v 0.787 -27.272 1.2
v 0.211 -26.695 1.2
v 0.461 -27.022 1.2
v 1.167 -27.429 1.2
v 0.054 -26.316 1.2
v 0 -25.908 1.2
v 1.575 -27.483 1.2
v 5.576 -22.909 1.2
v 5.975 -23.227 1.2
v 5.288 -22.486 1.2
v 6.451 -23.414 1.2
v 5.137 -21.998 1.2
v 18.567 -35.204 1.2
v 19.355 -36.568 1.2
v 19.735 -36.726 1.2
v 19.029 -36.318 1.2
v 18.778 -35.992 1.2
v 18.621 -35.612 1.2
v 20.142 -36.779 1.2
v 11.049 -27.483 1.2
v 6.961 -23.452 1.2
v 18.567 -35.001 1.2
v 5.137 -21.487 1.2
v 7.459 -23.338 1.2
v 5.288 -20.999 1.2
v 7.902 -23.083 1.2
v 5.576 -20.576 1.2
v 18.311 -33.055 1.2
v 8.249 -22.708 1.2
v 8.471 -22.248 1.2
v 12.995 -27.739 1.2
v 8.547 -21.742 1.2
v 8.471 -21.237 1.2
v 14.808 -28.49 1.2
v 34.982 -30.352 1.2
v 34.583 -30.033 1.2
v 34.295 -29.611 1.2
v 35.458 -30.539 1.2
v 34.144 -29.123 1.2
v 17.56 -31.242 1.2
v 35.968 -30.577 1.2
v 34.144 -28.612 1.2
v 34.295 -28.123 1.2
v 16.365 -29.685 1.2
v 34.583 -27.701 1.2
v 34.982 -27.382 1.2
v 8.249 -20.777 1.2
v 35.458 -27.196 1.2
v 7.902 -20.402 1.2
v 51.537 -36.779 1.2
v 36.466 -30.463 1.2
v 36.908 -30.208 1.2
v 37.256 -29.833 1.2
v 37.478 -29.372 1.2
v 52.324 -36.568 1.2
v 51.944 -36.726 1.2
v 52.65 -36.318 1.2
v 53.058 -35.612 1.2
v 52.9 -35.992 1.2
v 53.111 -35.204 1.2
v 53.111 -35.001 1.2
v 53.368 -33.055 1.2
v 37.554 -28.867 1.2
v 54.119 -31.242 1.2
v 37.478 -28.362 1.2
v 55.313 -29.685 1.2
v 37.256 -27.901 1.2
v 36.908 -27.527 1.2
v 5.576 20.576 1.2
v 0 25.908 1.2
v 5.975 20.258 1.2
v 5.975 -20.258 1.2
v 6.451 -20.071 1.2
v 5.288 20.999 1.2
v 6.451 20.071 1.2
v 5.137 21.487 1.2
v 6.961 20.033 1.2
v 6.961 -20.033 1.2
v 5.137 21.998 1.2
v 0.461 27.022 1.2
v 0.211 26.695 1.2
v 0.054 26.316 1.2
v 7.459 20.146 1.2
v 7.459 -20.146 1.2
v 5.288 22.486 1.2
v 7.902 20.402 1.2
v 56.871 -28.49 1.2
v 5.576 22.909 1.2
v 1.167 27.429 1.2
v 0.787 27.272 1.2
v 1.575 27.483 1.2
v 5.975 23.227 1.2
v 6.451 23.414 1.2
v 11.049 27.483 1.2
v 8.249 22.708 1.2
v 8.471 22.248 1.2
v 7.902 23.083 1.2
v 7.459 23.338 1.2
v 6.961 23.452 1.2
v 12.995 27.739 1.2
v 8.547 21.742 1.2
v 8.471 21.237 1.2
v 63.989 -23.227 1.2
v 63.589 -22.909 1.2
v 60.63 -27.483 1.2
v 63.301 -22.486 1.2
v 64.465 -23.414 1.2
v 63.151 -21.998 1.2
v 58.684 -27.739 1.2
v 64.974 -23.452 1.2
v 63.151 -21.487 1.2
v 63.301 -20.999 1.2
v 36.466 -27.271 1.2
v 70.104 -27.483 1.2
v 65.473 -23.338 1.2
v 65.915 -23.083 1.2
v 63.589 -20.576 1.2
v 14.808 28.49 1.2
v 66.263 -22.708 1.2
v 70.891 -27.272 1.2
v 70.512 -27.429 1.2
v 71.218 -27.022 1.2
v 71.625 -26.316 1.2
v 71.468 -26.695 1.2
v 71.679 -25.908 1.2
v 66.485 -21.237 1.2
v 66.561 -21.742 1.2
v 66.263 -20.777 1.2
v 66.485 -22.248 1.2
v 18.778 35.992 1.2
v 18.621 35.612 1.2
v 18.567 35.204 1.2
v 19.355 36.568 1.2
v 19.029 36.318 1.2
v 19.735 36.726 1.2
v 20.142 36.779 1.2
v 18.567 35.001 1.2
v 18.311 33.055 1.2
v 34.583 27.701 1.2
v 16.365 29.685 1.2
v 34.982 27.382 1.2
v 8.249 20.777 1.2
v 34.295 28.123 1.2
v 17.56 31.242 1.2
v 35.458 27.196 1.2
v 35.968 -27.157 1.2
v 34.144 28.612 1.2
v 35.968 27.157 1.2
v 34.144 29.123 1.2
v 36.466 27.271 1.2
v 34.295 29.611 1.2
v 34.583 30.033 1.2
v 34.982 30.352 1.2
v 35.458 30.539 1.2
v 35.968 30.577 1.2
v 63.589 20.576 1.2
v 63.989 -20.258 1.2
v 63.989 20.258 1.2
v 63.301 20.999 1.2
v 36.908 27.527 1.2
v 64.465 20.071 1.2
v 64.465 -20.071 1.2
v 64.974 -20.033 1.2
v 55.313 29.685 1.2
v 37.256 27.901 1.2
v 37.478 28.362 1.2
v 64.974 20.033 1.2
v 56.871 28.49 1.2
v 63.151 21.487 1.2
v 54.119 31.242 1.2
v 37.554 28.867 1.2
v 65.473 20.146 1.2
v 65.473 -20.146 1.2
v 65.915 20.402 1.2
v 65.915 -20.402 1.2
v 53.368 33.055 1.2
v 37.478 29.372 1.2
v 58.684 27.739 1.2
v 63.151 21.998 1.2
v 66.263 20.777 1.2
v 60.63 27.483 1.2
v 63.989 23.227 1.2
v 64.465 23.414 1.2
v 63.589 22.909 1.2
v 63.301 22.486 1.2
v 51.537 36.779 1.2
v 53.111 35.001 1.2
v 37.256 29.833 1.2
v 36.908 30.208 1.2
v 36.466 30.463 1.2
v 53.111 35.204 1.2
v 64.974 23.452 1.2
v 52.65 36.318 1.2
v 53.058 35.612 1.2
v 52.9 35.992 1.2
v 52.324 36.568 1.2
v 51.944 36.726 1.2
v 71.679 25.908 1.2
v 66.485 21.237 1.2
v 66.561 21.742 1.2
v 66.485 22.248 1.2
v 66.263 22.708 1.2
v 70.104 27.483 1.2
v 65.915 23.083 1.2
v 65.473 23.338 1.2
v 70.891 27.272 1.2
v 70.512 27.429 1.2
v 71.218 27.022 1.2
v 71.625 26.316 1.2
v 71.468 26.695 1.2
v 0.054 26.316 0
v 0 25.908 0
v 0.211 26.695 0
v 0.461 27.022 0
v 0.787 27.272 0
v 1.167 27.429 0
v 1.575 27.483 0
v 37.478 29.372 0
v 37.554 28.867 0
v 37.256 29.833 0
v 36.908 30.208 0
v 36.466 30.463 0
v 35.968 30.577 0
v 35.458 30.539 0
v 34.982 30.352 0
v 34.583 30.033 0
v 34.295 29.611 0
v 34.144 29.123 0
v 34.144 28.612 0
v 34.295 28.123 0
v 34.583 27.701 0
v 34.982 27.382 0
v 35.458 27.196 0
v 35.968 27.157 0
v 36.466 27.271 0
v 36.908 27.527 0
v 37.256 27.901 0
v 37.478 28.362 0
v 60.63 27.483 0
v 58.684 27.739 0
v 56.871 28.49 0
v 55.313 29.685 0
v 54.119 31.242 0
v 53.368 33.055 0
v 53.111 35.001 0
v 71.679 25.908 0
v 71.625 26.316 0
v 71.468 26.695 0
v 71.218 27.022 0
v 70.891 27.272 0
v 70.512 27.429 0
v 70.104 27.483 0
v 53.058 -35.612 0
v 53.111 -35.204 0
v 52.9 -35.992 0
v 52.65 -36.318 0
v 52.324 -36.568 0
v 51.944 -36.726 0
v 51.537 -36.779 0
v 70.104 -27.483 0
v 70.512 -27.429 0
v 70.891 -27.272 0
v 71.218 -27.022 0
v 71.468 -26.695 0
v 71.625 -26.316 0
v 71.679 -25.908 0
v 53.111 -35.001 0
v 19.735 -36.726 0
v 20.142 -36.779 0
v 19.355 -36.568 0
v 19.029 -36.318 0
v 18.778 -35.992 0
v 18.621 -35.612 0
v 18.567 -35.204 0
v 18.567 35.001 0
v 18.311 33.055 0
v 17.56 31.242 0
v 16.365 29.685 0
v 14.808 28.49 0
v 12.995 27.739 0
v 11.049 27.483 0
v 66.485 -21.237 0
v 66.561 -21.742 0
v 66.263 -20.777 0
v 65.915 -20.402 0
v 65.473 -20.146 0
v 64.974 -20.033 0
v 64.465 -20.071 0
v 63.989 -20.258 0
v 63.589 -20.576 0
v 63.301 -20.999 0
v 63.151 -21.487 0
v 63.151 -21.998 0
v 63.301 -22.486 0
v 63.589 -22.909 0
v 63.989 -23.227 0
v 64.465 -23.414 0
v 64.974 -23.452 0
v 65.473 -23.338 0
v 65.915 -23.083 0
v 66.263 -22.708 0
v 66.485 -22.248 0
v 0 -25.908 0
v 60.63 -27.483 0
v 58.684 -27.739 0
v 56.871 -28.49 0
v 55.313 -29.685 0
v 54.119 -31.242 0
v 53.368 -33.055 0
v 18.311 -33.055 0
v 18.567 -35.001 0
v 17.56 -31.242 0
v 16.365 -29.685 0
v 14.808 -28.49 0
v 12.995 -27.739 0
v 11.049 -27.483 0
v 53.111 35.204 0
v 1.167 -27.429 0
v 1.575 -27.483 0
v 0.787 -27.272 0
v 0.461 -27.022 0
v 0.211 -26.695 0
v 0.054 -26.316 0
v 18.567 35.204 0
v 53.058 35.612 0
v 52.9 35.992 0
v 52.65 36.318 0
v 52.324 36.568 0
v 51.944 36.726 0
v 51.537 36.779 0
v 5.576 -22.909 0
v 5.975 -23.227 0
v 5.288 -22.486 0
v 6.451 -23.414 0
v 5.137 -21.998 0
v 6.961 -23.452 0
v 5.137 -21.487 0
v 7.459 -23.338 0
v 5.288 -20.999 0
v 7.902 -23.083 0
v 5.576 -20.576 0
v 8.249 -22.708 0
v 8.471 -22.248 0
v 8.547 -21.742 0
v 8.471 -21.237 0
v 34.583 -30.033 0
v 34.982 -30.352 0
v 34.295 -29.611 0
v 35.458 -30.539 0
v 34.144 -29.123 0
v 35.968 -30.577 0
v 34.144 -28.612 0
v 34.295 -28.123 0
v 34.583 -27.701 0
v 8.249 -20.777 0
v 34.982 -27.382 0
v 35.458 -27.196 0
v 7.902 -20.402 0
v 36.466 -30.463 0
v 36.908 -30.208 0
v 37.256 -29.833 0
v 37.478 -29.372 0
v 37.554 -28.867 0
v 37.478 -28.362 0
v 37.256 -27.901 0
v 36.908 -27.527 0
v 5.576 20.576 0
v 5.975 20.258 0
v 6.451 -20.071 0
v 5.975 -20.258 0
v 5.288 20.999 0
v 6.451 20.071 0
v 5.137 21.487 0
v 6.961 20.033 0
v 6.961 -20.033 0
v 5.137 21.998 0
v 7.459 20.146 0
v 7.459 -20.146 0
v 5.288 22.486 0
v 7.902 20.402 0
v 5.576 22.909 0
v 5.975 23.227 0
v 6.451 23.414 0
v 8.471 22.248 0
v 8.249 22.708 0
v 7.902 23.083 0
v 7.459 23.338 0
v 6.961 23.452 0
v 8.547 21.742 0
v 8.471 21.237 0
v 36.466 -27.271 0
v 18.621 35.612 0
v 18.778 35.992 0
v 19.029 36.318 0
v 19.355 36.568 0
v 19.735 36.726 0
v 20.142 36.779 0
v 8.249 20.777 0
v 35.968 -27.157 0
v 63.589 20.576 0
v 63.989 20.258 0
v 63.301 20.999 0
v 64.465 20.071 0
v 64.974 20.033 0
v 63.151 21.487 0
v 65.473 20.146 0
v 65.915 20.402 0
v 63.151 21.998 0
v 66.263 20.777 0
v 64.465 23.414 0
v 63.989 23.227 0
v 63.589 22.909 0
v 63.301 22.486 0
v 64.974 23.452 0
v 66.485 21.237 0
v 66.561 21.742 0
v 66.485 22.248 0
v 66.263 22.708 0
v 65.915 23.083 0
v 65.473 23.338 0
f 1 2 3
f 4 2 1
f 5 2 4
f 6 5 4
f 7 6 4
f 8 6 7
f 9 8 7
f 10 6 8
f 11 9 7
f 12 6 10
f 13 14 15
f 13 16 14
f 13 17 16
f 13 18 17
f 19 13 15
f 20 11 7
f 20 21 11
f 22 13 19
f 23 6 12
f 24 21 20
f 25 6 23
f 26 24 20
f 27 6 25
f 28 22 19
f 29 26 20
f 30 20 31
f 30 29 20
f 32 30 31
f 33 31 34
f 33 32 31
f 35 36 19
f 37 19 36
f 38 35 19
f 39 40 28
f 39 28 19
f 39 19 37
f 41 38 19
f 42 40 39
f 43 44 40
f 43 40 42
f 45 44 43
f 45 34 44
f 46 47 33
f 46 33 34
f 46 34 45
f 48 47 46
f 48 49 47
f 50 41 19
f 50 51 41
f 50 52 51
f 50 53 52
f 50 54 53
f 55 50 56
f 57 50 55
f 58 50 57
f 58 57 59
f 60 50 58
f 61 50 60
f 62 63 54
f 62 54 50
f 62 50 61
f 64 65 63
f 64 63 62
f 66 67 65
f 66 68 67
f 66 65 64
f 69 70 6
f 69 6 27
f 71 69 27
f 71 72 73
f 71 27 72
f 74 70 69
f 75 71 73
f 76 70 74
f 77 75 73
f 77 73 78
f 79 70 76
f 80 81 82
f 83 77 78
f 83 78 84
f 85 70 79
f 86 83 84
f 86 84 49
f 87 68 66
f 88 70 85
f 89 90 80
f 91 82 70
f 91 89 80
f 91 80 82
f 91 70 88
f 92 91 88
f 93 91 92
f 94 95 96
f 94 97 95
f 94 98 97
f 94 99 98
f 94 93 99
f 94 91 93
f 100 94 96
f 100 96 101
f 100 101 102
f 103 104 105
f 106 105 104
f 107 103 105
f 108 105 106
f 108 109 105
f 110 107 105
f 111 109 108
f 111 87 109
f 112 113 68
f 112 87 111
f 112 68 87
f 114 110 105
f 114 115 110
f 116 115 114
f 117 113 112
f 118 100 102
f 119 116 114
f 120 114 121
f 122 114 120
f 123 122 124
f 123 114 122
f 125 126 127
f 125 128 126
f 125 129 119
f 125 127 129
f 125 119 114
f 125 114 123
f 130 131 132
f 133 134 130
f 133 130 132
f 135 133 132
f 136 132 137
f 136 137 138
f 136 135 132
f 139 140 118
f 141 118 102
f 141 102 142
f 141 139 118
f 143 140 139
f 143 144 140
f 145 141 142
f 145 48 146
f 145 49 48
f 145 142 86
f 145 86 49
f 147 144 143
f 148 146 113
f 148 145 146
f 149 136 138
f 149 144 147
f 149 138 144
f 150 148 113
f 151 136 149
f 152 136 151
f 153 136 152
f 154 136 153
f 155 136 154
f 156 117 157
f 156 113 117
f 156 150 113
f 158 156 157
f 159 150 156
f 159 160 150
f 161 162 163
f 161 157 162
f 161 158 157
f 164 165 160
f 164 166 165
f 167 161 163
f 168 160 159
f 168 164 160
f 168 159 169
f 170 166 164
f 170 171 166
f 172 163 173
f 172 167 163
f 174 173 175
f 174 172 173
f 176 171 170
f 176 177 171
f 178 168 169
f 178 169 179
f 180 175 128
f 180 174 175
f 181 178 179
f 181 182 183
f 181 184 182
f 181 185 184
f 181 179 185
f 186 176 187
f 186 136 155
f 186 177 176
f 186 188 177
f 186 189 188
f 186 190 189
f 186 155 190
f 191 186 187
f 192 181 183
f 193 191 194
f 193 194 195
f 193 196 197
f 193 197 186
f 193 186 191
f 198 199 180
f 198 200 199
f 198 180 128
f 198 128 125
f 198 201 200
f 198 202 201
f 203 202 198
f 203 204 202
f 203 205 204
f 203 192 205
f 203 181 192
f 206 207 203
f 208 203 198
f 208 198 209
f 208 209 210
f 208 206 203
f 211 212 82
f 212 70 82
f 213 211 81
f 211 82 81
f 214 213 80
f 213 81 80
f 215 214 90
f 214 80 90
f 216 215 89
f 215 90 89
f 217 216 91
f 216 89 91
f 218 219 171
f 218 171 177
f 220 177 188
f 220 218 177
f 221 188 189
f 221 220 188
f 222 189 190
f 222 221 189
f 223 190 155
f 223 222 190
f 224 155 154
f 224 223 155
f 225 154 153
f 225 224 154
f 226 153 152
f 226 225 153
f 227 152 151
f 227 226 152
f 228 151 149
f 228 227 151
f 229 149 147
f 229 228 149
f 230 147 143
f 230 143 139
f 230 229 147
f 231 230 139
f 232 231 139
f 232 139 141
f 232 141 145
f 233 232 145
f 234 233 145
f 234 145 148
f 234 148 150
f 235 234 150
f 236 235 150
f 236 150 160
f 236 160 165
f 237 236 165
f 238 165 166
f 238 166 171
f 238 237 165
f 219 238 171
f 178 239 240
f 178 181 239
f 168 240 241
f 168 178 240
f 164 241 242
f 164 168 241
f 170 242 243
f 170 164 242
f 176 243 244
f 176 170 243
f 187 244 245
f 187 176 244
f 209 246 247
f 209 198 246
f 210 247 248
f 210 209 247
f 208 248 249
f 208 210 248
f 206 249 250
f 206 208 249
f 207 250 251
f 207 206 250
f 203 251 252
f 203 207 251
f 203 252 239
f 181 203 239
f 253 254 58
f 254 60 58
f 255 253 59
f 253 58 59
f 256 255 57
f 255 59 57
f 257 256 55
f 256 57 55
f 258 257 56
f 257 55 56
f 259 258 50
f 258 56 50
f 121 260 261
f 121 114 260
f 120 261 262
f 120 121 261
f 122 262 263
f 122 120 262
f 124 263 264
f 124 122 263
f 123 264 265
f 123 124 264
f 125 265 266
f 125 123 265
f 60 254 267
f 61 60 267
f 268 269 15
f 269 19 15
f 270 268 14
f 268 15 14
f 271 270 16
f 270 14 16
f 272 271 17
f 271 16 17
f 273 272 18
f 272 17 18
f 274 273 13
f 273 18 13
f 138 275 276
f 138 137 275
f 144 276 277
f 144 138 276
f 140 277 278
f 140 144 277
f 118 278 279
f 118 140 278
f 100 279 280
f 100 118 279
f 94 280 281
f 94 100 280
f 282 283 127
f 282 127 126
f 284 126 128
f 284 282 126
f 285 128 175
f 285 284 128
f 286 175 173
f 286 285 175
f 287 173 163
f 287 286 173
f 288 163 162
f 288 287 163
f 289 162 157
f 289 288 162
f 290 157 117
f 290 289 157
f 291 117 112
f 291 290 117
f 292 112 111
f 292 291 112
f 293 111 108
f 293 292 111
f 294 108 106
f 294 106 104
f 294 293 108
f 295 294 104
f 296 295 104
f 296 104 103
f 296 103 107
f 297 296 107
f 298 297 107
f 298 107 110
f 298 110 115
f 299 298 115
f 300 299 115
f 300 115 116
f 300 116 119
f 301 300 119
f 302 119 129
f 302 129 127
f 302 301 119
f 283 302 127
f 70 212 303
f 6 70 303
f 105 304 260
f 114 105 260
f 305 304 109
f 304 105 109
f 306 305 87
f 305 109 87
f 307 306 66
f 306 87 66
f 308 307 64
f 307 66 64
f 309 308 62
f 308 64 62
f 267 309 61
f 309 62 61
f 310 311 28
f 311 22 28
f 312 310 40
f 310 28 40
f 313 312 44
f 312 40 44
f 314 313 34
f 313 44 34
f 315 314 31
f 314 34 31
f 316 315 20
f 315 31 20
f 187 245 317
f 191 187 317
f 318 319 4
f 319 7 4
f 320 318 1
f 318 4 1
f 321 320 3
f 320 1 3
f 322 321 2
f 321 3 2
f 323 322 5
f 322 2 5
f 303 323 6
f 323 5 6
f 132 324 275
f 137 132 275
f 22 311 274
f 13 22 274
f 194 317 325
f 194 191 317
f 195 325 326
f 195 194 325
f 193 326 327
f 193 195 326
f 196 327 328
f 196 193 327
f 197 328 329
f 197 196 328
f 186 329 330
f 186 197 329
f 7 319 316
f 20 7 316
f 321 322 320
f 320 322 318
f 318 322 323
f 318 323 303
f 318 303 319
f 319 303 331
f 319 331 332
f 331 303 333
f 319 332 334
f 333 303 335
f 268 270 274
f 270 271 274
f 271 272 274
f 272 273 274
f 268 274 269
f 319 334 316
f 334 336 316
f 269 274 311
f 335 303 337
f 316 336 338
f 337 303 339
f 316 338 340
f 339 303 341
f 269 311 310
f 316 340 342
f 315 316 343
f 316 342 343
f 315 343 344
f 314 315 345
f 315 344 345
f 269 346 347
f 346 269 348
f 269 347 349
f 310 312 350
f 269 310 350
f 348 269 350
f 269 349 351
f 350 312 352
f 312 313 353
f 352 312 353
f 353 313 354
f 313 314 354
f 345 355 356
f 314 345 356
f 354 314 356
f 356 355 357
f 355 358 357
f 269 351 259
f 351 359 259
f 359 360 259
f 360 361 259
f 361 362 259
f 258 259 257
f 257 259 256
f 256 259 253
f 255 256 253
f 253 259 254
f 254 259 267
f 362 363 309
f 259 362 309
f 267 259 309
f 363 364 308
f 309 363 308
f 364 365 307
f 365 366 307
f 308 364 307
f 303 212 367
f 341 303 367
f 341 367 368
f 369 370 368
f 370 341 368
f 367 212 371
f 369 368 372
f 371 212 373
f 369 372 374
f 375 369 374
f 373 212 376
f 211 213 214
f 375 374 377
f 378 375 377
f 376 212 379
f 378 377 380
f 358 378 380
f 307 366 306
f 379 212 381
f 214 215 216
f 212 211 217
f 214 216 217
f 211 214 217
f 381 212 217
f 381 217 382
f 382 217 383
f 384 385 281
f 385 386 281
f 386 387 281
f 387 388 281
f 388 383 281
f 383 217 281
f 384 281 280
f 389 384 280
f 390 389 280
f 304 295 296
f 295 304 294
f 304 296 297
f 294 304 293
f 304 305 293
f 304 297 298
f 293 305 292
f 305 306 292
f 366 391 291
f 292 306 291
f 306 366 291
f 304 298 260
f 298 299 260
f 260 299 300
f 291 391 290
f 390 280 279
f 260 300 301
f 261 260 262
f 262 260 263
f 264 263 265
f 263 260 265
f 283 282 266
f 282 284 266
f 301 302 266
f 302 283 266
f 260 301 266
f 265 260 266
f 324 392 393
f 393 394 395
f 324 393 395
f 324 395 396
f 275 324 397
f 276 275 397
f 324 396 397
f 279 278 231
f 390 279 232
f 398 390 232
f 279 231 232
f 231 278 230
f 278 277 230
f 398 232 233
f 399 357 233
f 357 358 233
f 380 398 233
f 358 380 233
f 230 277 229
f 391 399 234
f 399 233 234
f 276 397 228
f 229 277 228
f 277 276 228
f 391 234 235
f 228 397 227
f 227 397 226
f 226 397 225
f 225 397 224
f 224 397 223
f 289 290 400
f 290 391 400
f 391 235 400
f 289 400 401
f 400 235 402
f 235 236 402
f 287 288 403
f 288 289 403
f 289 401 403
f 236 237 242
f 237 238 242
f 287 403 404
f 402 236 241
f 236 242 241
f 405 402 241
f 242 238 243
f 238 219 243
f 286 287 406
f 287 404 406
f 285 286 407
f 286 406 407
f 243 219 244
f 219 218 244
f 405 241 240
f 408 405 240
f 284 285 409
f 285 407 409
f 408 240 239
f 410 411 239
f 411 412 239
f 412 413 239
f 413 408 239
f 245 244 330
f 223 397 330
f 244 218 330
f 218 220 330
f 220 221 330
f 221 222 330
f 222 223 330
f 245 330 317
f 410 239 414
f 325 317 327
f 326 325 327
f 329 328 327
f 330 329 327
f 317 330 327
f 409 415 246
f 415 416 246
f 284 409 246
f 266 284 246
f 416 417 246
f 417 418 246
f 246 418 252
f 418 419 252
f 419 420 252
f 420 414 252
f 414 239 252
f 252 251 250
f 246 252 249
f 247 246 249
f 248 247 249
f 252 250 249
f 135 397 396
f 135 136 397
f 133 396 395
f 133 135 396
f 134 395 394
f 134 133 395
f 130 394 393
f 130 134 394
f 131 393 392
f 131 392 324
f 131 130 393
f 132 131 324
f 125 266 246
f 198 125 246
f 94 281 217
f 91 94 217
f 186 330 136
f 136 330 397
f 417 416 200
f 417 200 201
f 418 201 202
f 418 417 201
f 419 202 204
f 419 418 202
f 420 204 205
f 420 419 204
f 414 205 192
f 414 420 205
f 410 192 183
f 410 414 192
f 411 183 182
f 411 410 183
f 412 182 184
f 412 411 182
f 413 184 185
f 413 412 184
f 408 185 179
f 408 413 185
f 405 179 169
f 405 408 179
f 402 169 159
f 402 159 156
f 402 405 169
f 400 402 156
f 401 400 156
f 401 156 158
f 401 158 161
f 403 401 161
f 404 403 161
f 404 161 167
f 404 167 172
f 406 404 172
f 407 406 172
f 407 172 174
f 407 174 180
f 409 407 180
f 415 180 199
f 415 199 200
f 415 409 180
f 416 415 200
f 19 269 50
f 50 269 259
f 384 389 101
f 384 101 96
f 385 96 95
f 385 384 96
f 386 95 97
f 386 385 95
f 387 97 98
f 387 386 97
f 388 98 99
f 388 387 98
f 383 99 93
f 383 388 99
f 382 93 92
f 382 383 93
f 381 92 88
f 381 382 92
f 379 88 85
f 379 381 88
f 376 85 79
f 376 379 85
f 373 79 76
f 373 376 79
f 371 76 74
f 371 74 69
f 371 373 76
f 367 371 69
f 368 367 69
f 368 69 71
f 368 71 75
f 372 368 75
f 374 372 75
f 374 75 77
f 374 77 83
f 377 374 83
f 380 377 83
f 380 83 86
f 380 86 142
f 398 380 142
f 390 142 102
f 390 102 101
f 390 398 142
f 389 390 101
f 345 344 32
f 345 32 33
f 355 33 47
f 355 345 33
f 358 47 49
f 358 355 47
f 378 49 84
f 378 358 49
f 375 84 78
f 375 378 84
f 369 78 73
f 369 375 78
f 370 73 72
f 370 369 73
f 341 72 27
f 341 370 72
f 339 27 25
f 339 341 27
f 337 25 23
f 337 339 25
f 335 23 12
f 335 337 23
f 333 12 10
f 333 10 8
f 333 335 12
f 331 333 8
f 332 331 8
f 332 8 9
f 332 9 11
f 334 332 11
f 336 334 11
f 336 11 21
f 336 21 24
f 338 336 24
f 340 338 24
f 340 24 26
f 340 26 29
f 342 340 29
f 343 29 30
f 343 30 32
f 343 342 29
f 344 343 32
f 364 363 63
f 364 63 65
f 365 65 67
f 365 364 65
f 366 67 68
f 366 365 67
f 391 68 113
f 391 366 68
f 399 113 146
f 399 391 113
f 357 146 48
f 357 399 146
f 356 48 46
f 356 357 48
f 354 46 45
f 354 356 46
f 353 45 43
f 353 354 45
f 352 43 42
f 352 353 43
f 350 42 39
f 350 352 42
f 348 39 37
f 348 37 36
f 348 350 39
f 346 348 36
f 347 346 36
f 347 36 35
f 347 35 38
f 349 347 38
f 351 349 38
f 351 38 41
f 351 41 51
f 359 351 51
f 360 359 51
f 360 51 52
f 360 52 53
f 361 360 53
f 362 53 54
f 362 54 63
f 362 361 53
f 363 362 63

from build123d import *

# Parameters (mm, degrees)
SKETCH1_R      = 1.7145
MAINBODY_DEPTH = 1.2
LARGEROUNDS_R  = 7.5184
SMALLROUNDS_R  = 1.5748


with BuildPart() as part:
    # Sketch1 → MainBody (new body)
    with BuildSketch(Plane.XY):
        Polygon((71.6788, -27.4828), (71.6788, 27.4828), (53.1114, 27.4828), (53.1114, 36.7792), (18.5674, 36.7792), (18.5674, 27.4828), (0, 27.4828), (0, -27.4828), (18.5674, -27.4828), (18.5674, -36.7792), (53.1114, -36.7792), (53.1114, -27.4828), align=None)
        with Locations((64.8462, -21.7424)):
            Circle(SKETCH1_R, mode=Mode.SUBTRACT)
        with Locations((6.8326, -21.7424)):
            Circle(SKETCH1_R, mode=Mode.SUBTRACT)
        with Locations((6.8326, 21.7424)):
            Circle(SKETCH1_R, mode=Mode.SUBTRACT)
        with Locations((64.8462, 21.7424)):
            Circle(SKETCH1_R, mode=Mode.SUBTRACT)
        with Locations((35.8394, -28.8671)):
            Circle(SKETCH1_R, mode=Mode.SUBTRACT)
        with Locations((35.8394, 28.8671)):
            Circle(SKETCH1_R, mode=Mode.SUBTRACT)
    extrude(amount=MAINBODY_DEPTH)

    # LargeRounds
    largerounds_edges = [part.edges().sort_by_distance(p)[0] for p in [
        (53.1114, -27.4828, 0.6),
        (18.5674, -27.4828, 0.6),
        (18.5674, 27.4828, 0.6),
        (53.1114, 27.4828, 0.6),
    ]]
    fillet(largerounds_edges, radius=LARGEROUNDS_R)

    # SmallRounds
    smallrounds_edges = [part.edges().sort_by_distance(p)[0] for p in [
        (53.1114, -36.7792, 0.6),
        (18.5674, -36.7792, 0.6),
        (0, -27.4828, 0.6),
        (0, 27.4828, 0.6),
        (18.5674, 36.7792, 0.6),
        (53.1114, 36.7792, 0.6),
        (71.6788, 27.4828, 0.6),
        (71.6788, -27.4828, 0.6),
    ]]
    fillet(smallrounds_edges, radius=SMALLROUNDS_R)


solid = part.part
